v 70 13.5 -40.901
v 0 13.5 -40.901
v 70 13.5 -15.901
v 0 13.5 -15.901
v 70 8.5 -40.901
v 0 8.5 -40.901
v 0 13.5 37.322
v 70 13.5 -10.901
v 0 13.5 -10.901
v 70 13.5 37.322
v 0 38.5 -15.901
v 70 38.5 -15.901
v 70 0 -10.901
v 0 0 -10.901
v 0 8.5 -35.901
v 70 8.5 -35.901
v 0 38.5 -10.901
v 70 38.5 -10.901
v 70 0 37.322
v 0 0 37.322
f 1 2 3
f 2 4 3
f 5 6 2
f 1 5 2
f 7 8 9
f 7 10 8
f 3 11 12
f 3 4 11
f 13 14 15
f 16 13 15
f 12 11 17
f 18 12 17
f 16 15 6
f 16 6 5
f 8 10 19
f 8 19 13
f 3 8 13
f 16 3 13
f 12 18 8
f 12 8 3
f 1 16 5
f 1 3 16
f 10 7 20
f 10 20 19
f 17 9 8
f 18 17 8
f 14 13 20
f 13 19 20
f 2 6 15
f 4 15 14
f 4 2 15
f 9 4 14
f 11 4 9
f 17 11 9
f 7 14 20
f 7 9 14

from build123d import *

# Parameters (mm, degrees)
F1_DEPTH = 70
F2_DEPTH = 5
F4_DEPTH = 25
F5_DEPTH = 5
F6_DEPTH = 5
F7_DEPTH = 13.5


with BuildPart() as f1:
    # F0 (on Right) → F1 (new body)
    with BuildSketch(Plane.YZ):
        Polygon((0, 26.0990989228), (0, 0), (0, -10.9009010772), (8.5, -35.9009010772), (13.5, -35.9009010772), (13.5, -15.9009010772), (33.5, -15.9009010772), (33.5, -10.9009010772), (13.5, -10.9009010772), (13.5, -5.7190796932), (13.5, 8.0284756223), (13.5, 26.0990989228), align=None)
    extrude(amount=F1_DEPTH)

    # F2 (add): a face of the model
    f2_faces = [f1.faces().sort_by_distance(p)[0] for p in [
        (35, 6.75, 26.0990989228),
    ]]
    extrude(f2_faces, amount=F2_DEPTH)

    # F3 (on face) → F4 (cut)
    with BuildSketch(Plane(origin=(0, 13.5, 0), x_dir=(-1, 0, 0), z_dir=(0, 1, 0))):
        Polygon((-70, 37.3218916357), (-70, 31.0990989228), (-40, 31.0990989228), (-35, 31.0990989228), (-30, 31.0990989228), (0, 31.0990989228), (0, 37.3218916357), align=None)
        Polygon((-70, -6.9171057179), (-70, -10.9009010772), (0, -10.9009010772), (0, -6.9171057179), (0, 31.0990989228), (-30, 31.0990989228), (-35, 31.0990989228), (-40, 31.0990989228), (-70, 31.0990989228), align=None)
    extrude(amount=-F4_DEPTH, mode=Mode.SUBTRACT)

    # F5 (add): a face of the model
    f5_faces = [f1.faces().sort_by_distance(p)[0] for p in [
        (35, 33.5, -13.4009010772),
    ]]
    extrude(f5_faces, amount=F5_DEPTH)

    # F6 (add): a face of the model
    f6_faces = [f1.faces().sort_by_distance(p)[0] for p in [
        (35, 11, -35.9009010772),
    ]]
    extrude(f6_faces, amount=F6_DEPTH)

    # F3 (on face) → F7 (join)
    with BuildSketch(Plane(origin=(0, 13.5, 0), x_dir=(-1, 0, 0), z_dir=(0, 1, 0))):
        Polygon((-70, -6.9171057179), (-70, -10.9009010772), (0, -10.9009010772), (0, -6.9171057179), (0, 37.3218916357), (-70, 37.3218916357), (-70, 31.0990989228), align=None)
    extrude(amount=-F7_DEPTH)


solid = f1.part
